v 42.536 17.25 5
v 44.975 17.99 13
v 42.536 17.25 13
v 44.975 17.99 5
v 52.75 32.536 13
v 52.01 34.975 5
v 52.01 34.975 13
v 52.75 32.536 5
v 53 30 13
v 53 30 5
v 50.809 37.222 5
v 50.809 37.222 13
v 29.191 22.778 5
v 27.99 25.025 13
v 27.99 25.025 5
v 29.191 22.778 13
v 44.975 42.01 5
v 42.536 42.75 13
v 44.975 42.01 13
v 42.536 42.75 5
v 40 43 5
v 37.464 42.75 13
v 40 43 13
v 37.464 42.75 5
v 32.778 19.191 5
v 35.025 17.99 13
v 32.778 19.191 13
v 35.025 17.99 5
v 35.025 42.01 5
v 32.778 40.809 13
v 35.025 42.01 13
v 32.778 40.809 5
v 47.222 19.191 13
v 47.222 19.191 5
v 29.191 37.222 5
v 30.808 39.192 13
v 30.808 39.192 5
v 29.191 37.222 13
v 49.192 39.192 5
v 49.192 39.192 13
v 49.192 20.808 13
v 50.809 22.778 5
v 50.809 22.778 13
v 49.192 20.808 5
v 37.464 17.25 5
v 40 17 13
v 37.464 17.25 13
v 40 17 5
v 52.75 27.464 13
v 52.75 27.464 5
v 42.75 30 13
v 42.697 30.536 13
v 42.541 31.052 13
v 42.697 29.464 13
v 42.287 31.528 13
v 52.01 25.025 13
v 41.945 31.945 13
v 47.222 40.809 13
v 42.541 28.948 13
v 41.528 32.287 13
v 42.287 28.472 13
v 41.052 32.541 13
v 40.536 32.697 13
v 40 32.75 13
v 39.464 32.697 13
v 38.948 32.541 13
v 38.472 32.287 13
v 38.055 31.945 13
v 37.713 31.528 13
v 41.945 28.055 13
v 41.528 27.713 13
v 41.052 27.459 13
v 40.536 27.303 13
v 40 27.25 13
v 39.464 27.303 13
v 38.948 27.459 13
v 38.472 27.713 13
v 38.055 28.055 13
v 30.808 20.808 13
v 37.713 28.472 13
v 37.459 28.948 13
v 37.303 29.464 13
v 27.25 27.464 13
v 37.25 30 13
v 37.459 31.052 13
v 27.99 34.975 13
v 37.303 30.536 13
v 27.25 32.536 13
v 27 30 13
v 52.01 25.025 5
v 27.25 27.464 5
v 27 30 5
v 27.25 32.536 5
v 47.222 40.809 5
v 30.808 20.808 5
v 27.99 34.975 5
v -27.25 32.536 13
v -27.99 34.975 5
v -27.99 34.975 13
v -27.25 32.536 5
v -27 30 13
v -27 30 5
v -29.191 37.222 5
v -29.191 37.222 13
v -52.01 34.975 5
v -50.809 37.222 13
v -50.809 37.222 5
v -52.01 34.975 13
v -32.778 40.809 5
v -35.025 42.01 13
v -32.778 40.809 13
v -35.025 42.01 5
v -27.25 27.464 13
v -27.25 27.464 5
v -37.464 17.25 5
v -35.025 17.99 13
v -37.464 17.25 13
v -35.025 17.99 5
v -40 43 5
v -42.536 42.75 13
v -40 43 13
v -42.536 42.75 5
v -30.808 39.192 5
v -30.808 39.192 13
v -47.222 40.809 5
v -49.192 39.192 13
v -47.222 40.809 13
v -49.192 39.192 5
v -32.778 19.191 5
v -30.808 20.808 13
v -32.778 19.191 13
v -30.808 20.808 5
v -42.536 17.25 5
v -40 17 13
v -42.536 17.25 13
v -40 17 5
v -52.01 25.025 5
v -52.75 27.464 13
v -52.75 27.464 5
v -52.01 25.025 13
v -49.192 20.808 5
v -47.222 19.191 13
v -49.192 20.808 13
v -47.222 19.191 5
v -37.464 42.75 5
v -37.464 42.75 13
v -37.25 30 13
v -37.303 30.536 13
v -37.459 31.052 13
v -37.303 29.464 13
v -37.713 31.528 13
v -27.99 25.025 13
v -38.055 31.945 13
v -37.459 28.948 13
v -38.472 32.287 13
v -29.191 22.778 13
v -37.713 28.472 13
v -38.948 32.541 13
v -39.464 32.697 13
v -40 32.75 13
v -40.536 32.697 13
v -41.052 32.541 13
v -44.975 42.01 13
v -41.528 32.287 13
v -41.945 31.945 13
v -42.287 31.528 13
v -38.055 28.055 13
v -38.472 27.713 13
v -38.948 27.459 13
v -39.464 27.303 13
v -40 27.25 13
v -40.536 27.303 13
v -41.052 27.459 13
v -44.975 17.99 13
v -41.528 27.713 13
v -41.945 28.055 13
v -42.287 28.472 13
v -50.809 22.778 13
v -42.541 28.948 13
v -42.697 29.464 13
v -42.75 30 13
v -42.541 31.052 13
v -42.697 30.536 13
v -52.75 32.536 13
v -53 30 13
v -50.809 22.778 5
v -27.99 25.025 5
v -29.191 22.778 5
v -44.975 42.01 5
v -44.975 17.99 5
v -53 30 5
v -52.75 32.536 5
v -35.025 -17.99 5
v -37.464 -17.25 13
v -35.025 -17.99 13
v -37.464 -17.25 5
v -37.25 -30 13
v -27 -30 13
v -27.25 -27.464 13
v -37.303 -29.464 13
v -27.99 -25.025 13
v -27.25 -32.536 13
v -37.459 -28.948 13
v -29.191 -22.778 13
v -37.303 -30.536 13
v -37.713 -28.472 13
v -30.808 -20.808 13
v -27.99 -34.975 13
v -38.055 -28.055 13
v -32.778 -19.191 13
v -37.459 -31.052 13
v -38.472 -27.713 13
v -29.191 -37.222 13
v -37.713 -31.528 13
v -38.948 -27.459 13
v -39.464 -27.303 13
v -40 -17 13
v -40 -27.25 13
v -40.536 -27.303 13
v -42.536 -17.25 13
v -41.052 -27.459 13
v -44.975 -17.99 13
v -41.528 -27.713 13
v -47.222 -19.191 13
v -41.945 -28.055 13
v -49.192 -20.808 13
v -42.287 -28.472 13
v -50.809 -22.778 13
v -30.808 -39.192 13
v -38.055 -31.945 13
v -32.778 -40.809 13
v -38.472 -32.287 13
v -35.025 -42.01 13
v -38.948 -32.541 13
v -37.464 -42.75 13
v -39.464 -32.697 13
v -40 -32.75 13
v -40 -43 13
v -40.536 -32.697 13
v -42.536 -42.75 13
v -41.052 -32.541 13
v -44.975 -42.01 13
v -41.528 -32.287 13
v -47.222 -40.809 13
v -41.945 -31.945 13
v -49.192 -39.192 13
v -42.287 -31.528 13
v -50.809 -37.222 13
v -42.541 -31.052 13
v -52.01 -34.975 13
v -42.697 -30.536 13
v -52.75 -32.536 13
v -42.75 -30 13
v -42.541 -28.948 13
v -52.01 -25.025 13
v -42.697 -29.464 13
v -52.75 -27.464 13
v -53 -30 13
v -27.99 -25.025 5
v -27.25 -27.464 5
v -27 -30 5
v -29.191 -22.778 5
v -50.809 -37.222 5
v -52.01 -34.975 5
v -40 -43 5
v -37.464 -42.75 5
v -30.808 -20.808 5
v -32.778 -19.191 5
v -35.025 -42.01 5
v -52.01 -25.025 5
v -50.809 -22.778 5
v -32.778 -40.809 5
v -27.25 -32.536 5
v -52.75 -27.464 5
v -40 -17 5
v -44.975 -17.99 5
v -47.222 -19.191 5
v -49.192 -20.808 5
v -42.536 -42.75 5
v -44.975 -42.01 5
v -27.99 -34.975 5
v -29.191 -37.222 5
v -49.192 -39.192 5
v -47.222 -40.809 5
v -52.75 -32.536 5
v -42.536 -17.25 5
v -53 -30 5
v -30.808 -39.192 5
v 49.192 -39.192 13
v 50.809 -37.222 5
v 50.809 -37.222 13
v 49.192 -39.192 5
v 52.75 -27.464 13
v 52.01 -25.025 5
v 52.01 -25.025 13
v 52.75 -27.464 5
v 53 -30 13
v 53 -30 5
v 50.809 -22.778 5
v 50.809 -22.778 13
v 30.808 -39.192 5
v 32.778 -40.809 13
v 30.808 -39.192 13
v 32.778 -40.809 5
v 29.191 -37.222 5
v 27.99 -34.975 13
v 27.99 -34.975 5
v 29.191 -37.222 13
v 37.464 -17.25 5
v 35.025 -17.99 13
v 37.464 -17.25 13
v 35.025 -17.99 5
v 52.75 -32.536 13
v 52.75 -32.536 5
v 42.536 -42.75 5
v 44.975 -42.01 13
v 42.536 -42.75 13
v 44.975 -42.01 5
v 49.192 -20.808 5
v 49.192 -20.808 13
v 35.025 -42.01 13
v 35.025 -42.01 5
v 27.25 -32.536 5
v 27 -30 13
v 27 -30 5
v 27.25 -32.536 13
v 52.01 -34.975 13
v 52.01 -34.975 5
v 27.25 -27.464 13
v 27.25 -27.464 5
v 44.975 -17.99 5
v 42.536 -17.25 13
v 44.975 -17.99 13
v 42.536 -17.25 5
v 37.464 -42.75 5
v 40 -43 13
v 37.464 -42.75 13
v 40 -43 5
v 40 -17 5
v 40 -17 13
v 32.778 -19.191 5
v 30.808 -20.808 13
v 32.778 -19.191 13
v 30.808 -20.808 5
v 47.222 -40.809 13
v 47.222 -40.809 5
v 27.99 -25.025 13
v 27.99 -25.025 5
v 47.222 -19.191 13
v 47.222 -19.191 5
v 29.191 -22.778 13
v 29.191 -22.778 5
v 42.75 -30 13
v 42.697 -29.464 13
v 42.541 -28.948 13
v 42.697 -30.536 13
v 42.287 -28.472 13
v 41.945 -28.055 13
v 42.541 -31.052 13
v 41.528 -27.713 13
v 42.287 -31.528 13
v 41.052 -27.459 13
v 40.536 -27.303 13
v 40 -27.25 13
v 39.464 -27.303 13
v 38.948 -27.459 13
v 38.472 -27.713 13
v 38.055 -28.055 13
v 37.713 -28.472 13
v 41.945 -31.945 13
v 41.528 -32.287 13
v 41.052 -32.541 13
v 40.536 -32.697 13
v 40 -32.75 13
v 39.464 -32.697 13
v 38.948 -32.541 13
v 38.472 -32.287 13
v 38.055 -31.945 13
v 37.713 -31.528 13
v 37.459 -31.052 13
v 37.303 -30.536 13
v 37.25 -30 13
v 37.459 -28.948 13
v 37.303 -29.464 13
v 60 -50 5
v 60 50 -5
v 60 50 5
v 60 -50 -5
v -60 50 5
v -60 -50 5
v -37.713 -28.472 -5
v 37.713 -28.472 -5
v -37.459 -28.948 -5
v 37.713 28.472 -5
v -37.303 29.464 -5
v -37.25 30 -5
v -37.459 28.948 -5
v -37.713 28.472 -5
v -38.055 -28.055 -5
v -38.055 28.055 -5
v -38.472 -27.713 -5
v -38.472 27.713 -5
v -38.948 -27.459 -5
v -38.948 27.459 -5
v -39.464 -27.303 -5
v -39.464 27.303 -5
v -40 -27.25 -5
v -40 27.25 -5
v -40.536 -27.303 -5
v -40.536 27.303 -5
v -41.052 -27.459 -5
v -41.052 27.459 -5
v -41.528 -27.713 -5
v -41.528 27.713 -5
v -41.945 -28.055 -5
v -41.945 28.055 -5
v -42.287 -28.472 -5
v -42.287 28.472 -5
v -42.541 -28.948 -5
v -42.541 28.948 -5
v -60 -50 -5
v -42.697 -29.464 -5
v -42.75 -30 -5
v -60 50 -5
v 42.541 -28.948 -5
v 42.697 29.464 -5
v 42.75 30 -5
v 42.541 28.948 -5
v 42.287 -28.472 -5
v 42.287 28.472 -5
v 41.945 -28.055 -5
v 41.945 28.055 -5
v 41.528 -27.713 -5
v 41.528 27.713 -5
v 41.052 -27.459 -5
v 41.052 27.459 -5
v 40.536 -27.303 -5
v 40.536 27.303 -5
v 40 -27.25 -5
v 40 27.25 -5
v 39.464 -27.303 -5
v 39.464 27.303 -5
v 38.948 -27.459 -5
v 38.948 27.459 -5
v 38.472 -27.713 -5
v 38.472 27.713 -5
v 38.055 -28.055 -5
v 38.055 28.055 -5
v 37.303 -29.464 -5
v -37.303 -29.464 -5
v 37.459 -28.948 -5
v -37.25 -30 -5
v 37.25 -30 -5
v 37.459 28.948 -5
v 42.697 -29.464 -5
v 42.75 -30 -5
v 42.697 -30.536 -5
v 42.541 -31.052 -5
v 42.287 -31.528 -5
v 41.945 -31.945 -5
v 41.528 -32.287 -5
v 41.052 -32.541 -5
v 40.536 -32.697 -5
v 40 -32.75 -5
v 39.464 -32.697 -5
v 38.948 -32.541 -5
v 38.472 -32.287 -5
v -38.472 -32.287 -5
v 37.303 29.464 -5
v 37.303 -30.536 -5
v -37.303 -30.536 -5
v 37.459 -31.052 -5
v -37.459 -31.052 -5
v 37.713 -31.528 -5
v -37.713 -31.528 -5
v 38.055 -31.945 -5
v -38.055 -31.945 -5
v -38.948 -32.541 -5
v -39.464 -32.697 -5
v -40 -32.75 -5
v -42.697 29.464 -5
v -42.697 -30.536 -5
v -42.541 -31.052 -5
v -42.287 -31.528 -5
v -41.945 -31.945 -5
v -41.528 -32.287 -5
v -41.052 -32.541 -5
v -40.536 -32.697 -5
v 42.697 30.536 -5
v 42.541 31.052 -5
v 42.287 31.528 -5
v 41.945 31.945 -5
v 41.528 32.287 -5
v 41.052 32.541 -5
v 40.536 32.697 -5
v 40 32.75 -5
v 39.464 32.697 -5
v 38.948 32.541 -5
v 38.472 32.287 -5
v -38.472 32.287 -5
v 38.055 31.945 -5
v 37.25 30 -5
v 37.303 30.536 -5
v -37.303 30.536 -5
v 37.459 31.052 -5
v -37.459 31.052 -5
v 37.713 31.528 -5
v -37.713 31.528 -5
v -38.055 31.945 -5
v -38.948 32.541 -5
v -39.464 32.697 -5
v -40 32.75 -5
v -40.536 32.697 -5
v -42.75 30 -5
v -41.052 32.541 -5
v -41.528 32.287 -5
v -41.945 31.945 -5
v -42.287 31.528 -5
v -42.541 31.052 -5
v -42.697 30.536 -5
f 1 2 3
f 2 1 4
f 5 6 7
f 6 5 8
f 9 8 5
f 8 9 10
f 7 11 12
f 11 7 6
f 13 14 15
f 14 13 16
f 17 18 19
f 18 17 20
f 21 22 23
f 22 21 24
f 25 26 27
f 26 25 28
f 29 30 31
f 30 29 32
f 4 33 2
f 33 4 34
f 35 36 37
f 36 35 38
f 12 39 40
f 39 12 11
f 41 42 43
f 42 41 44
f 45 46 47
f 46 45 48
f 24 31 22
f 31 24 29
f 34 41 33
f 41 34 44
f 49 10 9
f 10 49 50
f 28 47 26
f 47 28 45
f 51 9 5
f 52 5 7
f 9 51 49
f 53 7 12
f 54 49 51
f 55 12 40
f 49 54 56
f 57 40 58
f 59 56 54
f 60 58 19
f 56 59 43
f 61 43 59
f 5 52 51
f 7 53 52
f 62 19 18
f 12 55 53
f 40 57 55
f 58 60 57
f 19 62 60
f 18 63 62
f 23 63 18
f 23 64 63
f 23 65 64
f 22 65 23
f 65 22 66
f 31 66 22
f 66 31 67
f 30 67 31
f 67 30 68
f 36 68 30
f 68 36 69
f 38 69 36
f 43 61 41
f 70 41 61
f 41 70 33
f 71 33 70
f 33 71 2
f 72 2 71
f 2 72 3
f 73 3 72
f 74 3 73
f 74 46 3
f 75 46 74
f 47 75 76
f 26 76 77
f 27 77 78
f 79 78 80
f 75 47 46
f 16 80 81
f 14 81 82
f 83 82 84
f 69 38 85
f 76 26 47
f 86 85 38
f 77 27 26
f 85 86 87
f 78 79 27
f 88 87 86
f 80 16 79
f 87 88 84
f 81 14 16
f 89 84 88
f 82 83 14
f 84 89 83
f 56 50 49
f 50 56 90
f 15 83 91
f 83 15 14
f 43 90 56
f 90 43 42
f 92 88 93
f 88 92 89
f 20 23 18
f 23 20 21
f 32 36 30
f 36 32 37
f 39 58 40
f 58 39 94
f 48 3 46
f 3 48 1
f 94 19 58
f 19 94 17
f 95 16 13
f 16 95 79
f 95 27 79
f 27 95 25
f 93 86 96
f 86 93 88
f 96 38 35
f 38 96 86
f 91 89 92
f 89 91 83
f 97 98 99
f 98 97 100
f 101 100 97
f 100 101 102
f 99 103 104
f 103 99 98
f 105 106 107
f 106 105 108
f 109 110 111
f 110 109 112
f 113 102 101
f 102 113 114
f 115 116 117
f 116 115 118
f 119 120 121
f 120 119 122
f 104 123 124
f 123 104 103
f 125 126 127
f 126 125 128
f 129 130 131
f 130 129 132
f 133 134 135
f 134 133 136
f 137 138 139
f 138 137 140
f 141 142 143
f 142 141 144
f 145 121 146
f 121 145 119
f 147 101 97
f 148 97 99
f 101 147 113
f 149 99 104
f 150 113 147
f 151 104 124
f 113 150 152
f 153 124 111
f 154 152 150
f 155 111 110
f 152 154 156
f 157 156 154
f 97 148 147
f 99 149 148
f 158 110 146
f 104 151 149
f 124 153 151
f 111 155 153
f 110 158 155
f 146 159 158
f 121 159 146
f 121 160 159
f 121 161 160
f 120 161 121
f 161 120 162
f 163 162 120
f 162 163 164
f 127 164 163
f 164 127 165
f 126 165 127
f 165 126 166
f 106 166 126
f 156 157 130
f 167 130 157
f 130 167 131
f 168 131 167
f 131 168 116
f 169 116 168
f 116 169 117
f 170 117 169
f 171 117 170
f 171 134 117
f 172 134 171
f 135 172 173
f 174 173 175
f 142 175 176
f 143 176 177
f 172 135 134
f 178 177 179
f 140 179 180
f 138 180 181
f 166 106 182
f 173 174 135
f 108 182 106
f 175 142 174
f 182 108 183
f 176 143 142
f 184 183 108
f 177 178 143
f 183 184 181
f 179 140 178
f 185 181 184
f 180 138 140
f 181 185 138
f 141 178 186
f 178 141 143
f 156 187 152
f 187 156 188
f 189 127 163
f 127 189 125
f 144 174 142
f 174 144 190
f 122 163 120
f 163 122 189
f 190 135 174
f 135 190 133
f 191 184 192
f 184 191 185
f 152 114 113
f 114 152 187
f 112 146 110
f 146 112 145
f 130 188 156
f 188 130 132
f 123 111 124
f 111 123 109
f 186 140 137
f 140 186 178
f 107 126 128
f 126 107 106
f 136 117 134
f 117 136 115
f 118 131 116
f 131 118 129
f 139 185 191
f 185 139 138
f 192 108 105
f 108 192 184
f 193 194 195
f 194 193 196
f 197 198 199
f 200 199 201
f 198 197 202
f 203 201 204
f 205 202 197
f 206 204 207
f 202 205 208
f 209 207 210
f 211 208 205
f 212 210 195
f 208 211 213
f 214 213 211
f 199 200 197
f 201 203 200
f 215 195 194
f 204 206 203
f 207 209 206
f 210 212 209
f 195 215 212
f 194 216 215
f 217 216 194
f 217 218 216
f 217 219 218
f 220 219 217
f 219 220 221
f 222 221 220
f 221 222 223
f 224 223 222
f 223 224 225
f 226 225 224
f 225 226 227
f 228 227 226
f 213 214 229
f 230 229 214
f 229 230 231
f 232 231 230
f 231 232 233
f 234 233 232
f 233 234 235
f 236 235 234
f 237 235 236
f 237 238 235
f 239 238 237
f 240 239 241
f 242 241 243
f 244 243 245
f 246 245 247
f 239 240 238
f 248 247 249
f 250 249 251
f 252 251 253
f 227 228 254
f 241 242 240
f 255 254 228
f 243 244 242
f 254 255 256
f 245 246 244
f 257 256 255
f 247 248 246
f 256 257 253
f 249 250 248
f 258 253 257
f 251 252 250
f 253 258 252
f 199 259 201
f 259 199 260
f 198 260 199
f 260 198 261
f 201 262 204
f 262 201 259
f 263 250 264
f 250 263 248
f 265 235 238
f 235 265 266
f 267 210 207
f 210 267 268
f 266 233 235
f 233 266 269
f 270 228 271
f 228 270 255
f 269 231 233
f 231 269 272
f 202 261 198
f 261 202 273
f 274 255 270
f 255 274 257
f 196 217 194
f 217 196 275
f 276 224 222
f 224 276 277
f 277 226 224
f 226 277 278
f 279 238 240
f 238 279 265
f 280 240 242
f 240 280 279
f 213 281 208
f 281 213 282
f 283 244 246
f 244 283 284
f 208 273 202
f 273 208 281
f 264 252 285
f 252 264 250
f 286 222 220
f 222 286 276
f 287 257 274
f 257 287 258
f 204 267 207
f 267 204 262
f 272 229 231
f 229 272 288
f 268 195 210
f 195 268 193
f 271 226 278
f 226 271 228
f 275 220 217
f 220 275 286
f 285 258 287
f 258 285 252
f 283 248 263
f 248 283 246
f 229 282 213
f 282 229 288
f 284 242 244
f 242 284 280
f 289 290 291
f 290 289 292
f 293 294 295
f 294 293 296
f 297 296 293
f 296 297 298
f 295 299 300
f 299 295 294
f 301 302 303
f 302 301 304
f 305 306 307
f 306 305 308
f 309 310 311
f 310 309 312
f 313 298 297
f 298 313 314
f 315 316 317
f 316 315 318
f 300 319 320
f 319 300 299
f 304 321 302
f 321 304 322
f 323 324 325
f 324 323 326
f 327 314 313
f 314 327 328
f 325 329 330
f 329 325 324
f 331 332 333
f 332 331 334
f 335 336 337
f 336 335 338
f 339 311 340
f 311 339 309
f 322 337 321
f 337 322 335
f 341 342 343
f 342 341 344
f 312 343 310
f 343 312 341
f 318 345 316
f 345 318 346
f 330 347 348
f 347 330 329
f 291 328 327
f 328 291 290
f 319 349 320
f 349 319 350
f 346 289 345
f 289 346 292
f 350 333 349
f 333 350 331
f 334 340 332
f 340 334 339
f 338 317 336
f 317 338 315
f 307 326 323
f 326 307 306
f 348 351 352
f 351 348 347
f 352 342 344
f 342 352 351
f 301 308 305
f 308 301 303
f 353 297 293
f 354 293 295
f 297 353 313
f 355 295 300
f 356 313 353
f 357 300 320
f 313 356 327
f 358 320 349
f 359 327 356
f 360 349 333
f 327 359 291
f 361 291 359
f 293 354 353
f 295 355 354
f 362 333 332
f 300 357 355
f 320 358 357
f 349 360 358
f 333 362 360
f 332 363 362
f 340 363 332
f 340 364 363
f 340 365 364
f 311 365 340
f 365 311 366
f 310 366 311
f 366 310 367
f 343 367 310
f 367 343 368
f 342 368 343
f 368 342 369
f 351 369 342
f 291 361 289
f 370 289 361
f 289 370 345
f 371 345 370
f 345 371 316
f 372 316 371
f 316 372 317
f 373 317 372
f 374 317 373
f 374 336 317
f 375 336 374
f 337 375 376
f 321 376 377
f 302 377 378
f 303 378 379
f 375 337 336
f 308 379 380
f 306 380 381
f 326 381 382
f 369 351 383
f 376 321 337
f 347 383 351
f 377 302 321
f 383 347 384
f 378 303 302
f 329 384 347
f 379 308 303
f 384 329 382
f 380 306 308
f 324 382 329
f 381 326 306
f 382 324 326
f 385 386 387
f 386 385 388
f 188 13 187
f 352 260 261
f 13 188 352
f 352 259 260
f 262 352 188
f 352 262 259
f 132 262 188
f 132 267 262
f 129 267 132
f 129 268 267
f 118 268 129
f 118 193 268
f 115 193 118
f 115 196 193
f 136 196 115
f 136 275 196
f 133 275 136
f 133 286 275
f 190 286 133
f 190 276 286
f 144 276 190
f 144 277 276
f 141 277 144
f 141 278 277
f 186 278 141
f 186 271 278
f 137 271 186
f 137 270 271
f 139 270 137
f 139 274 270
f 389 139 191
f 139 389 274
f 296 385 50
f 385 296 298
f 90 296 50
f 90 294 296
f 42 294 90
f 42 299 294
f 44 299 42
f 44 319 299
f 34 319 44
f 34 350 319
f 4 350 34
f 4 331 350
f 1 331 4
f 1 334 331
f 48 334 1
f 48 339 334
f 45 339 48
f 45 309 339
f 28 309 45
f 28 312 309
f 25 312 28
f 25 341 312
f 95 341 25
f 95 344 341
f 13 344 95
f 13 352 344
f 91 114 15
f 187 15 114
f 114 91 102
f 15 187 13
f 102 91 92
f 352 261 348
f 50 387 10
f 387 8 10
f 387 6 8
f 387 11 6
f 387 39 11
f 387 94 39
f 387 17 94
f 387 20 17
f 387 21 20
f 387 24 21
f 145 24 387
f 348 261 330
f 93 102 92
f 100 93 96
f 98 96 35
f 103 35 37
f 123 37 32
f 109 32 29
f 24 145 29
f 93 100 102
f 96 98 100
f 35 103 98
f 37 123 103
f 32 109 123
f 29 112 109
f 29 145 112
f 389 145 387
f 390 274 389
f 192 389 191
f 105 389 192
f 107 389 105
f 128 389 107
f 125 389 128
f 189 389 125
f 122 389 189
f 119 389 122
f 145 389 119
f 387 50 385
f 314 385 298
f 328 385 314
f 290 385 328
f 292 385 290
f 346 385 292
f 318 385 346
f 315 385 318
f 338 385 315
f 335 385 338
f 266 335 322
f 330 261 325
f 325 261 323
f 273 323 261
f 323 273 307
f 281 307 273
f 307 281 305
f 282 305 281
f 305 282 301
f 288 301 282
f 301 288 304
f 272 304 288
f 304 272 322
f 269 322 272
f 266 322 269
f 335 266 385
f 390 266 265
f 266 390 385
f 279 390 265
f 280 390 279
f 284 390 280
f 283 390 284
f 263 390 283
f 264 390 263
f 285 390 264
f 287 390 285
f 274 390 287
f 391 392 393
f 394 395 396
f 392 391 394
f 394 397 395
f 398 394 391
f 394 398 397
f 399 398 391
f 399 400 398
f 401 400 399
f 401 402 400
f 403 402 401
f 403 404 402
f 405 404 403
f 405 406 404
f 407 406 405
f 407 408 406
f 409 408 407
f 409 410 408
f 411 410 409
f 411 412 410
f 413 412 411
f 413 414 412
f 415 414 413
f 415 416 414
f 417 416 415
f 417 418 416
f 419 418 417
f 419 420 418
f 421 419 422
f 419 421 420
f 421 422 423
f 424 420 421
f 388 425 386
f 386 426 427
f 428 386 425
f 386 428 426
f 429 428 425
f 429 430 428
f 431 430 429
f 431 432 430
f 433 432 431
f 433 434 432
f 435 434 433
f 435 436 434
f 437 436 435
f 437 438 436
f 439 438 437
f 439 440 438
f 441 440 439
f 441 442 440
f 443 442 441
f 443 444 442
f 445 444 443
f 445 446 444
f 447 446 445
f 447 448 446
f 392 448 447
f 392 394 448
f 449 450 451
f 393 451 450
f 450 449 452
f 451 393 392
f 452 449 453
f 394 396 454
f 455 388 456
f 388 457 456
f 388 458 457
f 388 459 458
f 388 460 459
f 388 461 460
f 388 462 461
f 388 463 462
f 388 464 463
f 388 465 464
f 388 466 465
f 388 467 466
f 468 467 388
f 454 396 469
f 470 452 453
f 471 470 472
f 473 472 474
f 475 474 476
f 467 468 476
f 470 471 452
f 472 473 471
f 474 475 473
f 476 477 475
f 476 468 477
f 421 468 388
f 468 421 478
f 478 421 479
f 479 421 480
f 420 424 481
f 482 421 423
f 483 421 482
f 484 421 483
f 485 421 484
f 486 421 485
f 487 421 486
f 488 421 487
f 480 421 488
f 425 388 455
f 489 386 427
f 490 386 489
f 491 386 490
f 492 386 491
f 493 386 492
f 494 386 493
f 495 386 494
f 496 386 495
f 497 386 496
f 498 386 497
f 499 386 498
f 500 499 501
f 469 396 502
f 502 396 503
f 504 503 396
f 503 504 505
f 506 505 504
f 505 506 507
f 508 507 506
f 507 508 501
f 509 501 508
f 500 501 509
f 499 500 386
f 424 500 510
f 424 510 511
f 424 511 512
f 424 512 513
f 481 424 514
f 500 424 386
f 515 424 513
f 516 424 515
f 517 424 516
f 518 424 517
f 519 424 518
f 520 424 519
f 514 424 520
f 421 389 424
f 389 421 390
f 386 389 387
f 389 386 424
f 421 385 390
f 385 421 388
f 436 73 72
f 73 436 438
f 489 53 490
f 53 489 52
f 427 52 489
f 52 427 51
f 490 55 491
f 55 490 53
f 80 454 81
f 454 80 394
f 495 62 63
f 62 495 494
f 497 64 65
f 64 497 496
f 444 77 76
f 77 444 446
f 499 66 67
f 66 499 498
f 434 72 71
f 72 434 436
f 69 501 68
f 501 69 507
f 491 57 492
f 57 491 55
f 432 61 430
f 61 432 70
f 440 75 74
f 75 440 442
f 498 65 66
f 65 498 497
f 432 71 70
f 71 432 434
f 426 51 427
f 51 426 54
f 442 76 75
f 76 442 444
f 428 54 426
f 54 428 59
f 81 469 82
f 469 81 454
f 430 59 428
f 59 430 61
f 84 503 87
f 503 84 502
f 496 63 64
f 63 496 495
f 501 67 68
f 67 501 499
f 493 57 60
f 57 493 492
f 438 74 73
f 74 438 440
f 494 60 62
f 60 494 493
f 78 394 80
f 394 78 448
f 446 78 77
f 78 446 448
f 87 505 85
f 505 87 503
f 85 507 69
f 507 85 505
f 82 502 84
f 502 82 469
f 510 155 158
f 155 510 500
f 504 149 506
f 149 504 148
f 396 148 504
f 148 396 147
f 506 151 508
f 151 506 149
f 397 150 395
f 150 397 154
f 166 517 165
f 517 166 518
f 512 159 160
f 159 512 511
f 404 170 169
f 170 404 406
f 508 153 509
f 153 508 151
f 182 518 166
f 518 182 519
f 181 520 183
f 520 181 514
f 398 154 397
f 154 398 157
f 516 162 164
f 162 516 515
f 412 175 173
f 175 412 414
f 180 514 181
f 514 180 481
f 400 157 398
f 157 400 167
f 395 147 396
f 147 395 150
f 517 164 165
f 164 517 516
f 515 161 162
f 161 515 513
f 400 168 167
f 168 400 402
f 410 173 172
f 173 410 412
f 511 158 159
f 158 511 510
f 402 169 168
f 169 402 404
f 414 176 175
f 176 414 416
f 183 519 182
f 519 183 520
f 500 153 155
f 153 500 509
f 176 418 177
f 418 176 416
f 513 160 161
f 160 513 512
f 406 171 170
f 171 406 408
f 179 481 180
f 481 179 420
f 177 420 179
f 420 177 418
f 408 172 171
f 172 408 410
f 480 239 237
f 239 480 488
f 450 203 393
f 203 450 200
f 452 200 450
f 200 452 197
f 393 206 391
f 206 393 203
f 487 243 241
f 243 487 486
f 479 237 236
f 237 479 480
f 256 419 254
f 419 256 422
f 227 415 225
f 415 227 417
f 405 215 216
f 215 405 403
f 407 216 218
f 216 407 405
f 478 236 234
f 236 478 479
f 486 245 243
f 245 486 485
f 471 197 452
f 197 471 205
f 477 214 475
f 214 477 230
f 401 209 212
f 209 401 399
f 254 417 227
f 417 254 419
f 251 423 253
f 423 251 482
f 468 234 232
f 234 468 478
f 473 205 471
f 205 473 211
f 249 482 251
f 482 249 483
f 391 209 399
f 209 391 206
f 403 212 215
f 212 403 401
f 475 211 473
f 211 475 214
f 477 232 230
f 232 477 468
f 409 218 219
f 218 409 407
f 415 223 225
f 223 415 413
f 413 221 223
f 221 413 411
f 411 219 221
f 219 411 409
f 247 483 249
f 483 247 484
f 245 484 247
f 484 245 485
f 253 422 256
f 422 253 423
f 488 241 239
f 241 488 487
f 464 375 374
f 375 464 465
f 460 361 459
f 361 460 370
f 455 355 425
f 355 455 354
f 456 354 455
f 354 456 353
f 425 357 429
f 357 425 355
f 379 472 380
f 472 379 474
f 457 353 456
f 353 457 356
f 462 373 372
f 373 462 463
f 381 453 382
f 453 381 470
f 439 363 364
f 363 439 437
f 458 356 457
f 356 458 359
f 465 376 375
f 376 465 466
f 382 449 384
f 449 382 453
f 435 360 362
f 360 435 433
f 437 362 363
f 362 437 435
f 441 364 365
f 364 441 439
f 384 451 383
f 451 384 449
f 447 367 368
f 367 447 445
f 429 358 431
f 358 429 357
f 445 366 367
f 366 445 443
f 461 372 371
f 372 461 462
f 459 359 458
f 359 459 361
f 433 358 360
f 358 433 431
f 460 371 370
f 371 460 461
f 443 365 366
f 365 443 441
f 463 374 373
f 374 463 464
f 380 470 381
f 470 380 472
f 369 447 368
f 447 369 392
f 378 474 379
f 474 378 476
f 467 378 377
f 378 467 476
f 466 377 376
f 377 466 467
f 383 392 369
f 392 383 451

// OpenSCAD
$fn = 32;

// ----------------------------------------------------------------------
// Anchor pads 120 x 100 x 18
// four corner bosses with anchor holes
// ----------------------------------------------------------------------

// --- parameters (mm) ---
plate = [120, 100, 10];  // base plate size (x, y, z)
pads = 4;                // boss count, one per corner
edge = 20;               // boss centre offset from the plate edge
boss_d = 26;             // boss diameter
boss_h = 8;              // boss height above the base plate
hole_d = 5.5;            // hole diameter

// --- derived feature positions (mm) ---
height = plate[2] + boss_h;      // = 18   overall height of the part
corner_x = plate[0] / 2 - edge;  // = 40   boss centre X
corner_y = plate[1] / 2 - edge;  // = 30   boss centre Y
feature_centers = [
  [corner_x, corner_y],
  [-corner_x, corner_y],
  [-corner_x, -corner_y],
  [corner_x, -corner_y]
];   // boss centres, anchor holes are drilled there

// base plate, four bosses standing on it, anchor holes all the way through
difference() {
  union() {
    cube(plate, center = true);
    for (centre = feature_centers)
      translate([centre[0], centre[1], plate[2] / 2 - 1])
        cylinder(d = boss_d, h = boss_h + 1);
  }
  for (centre = feature_centers)
    translate([centre[0], centre[1], -height])
      cylinder(d = hole_d, h = 2 * height + 2);  // through boss and plate
}
